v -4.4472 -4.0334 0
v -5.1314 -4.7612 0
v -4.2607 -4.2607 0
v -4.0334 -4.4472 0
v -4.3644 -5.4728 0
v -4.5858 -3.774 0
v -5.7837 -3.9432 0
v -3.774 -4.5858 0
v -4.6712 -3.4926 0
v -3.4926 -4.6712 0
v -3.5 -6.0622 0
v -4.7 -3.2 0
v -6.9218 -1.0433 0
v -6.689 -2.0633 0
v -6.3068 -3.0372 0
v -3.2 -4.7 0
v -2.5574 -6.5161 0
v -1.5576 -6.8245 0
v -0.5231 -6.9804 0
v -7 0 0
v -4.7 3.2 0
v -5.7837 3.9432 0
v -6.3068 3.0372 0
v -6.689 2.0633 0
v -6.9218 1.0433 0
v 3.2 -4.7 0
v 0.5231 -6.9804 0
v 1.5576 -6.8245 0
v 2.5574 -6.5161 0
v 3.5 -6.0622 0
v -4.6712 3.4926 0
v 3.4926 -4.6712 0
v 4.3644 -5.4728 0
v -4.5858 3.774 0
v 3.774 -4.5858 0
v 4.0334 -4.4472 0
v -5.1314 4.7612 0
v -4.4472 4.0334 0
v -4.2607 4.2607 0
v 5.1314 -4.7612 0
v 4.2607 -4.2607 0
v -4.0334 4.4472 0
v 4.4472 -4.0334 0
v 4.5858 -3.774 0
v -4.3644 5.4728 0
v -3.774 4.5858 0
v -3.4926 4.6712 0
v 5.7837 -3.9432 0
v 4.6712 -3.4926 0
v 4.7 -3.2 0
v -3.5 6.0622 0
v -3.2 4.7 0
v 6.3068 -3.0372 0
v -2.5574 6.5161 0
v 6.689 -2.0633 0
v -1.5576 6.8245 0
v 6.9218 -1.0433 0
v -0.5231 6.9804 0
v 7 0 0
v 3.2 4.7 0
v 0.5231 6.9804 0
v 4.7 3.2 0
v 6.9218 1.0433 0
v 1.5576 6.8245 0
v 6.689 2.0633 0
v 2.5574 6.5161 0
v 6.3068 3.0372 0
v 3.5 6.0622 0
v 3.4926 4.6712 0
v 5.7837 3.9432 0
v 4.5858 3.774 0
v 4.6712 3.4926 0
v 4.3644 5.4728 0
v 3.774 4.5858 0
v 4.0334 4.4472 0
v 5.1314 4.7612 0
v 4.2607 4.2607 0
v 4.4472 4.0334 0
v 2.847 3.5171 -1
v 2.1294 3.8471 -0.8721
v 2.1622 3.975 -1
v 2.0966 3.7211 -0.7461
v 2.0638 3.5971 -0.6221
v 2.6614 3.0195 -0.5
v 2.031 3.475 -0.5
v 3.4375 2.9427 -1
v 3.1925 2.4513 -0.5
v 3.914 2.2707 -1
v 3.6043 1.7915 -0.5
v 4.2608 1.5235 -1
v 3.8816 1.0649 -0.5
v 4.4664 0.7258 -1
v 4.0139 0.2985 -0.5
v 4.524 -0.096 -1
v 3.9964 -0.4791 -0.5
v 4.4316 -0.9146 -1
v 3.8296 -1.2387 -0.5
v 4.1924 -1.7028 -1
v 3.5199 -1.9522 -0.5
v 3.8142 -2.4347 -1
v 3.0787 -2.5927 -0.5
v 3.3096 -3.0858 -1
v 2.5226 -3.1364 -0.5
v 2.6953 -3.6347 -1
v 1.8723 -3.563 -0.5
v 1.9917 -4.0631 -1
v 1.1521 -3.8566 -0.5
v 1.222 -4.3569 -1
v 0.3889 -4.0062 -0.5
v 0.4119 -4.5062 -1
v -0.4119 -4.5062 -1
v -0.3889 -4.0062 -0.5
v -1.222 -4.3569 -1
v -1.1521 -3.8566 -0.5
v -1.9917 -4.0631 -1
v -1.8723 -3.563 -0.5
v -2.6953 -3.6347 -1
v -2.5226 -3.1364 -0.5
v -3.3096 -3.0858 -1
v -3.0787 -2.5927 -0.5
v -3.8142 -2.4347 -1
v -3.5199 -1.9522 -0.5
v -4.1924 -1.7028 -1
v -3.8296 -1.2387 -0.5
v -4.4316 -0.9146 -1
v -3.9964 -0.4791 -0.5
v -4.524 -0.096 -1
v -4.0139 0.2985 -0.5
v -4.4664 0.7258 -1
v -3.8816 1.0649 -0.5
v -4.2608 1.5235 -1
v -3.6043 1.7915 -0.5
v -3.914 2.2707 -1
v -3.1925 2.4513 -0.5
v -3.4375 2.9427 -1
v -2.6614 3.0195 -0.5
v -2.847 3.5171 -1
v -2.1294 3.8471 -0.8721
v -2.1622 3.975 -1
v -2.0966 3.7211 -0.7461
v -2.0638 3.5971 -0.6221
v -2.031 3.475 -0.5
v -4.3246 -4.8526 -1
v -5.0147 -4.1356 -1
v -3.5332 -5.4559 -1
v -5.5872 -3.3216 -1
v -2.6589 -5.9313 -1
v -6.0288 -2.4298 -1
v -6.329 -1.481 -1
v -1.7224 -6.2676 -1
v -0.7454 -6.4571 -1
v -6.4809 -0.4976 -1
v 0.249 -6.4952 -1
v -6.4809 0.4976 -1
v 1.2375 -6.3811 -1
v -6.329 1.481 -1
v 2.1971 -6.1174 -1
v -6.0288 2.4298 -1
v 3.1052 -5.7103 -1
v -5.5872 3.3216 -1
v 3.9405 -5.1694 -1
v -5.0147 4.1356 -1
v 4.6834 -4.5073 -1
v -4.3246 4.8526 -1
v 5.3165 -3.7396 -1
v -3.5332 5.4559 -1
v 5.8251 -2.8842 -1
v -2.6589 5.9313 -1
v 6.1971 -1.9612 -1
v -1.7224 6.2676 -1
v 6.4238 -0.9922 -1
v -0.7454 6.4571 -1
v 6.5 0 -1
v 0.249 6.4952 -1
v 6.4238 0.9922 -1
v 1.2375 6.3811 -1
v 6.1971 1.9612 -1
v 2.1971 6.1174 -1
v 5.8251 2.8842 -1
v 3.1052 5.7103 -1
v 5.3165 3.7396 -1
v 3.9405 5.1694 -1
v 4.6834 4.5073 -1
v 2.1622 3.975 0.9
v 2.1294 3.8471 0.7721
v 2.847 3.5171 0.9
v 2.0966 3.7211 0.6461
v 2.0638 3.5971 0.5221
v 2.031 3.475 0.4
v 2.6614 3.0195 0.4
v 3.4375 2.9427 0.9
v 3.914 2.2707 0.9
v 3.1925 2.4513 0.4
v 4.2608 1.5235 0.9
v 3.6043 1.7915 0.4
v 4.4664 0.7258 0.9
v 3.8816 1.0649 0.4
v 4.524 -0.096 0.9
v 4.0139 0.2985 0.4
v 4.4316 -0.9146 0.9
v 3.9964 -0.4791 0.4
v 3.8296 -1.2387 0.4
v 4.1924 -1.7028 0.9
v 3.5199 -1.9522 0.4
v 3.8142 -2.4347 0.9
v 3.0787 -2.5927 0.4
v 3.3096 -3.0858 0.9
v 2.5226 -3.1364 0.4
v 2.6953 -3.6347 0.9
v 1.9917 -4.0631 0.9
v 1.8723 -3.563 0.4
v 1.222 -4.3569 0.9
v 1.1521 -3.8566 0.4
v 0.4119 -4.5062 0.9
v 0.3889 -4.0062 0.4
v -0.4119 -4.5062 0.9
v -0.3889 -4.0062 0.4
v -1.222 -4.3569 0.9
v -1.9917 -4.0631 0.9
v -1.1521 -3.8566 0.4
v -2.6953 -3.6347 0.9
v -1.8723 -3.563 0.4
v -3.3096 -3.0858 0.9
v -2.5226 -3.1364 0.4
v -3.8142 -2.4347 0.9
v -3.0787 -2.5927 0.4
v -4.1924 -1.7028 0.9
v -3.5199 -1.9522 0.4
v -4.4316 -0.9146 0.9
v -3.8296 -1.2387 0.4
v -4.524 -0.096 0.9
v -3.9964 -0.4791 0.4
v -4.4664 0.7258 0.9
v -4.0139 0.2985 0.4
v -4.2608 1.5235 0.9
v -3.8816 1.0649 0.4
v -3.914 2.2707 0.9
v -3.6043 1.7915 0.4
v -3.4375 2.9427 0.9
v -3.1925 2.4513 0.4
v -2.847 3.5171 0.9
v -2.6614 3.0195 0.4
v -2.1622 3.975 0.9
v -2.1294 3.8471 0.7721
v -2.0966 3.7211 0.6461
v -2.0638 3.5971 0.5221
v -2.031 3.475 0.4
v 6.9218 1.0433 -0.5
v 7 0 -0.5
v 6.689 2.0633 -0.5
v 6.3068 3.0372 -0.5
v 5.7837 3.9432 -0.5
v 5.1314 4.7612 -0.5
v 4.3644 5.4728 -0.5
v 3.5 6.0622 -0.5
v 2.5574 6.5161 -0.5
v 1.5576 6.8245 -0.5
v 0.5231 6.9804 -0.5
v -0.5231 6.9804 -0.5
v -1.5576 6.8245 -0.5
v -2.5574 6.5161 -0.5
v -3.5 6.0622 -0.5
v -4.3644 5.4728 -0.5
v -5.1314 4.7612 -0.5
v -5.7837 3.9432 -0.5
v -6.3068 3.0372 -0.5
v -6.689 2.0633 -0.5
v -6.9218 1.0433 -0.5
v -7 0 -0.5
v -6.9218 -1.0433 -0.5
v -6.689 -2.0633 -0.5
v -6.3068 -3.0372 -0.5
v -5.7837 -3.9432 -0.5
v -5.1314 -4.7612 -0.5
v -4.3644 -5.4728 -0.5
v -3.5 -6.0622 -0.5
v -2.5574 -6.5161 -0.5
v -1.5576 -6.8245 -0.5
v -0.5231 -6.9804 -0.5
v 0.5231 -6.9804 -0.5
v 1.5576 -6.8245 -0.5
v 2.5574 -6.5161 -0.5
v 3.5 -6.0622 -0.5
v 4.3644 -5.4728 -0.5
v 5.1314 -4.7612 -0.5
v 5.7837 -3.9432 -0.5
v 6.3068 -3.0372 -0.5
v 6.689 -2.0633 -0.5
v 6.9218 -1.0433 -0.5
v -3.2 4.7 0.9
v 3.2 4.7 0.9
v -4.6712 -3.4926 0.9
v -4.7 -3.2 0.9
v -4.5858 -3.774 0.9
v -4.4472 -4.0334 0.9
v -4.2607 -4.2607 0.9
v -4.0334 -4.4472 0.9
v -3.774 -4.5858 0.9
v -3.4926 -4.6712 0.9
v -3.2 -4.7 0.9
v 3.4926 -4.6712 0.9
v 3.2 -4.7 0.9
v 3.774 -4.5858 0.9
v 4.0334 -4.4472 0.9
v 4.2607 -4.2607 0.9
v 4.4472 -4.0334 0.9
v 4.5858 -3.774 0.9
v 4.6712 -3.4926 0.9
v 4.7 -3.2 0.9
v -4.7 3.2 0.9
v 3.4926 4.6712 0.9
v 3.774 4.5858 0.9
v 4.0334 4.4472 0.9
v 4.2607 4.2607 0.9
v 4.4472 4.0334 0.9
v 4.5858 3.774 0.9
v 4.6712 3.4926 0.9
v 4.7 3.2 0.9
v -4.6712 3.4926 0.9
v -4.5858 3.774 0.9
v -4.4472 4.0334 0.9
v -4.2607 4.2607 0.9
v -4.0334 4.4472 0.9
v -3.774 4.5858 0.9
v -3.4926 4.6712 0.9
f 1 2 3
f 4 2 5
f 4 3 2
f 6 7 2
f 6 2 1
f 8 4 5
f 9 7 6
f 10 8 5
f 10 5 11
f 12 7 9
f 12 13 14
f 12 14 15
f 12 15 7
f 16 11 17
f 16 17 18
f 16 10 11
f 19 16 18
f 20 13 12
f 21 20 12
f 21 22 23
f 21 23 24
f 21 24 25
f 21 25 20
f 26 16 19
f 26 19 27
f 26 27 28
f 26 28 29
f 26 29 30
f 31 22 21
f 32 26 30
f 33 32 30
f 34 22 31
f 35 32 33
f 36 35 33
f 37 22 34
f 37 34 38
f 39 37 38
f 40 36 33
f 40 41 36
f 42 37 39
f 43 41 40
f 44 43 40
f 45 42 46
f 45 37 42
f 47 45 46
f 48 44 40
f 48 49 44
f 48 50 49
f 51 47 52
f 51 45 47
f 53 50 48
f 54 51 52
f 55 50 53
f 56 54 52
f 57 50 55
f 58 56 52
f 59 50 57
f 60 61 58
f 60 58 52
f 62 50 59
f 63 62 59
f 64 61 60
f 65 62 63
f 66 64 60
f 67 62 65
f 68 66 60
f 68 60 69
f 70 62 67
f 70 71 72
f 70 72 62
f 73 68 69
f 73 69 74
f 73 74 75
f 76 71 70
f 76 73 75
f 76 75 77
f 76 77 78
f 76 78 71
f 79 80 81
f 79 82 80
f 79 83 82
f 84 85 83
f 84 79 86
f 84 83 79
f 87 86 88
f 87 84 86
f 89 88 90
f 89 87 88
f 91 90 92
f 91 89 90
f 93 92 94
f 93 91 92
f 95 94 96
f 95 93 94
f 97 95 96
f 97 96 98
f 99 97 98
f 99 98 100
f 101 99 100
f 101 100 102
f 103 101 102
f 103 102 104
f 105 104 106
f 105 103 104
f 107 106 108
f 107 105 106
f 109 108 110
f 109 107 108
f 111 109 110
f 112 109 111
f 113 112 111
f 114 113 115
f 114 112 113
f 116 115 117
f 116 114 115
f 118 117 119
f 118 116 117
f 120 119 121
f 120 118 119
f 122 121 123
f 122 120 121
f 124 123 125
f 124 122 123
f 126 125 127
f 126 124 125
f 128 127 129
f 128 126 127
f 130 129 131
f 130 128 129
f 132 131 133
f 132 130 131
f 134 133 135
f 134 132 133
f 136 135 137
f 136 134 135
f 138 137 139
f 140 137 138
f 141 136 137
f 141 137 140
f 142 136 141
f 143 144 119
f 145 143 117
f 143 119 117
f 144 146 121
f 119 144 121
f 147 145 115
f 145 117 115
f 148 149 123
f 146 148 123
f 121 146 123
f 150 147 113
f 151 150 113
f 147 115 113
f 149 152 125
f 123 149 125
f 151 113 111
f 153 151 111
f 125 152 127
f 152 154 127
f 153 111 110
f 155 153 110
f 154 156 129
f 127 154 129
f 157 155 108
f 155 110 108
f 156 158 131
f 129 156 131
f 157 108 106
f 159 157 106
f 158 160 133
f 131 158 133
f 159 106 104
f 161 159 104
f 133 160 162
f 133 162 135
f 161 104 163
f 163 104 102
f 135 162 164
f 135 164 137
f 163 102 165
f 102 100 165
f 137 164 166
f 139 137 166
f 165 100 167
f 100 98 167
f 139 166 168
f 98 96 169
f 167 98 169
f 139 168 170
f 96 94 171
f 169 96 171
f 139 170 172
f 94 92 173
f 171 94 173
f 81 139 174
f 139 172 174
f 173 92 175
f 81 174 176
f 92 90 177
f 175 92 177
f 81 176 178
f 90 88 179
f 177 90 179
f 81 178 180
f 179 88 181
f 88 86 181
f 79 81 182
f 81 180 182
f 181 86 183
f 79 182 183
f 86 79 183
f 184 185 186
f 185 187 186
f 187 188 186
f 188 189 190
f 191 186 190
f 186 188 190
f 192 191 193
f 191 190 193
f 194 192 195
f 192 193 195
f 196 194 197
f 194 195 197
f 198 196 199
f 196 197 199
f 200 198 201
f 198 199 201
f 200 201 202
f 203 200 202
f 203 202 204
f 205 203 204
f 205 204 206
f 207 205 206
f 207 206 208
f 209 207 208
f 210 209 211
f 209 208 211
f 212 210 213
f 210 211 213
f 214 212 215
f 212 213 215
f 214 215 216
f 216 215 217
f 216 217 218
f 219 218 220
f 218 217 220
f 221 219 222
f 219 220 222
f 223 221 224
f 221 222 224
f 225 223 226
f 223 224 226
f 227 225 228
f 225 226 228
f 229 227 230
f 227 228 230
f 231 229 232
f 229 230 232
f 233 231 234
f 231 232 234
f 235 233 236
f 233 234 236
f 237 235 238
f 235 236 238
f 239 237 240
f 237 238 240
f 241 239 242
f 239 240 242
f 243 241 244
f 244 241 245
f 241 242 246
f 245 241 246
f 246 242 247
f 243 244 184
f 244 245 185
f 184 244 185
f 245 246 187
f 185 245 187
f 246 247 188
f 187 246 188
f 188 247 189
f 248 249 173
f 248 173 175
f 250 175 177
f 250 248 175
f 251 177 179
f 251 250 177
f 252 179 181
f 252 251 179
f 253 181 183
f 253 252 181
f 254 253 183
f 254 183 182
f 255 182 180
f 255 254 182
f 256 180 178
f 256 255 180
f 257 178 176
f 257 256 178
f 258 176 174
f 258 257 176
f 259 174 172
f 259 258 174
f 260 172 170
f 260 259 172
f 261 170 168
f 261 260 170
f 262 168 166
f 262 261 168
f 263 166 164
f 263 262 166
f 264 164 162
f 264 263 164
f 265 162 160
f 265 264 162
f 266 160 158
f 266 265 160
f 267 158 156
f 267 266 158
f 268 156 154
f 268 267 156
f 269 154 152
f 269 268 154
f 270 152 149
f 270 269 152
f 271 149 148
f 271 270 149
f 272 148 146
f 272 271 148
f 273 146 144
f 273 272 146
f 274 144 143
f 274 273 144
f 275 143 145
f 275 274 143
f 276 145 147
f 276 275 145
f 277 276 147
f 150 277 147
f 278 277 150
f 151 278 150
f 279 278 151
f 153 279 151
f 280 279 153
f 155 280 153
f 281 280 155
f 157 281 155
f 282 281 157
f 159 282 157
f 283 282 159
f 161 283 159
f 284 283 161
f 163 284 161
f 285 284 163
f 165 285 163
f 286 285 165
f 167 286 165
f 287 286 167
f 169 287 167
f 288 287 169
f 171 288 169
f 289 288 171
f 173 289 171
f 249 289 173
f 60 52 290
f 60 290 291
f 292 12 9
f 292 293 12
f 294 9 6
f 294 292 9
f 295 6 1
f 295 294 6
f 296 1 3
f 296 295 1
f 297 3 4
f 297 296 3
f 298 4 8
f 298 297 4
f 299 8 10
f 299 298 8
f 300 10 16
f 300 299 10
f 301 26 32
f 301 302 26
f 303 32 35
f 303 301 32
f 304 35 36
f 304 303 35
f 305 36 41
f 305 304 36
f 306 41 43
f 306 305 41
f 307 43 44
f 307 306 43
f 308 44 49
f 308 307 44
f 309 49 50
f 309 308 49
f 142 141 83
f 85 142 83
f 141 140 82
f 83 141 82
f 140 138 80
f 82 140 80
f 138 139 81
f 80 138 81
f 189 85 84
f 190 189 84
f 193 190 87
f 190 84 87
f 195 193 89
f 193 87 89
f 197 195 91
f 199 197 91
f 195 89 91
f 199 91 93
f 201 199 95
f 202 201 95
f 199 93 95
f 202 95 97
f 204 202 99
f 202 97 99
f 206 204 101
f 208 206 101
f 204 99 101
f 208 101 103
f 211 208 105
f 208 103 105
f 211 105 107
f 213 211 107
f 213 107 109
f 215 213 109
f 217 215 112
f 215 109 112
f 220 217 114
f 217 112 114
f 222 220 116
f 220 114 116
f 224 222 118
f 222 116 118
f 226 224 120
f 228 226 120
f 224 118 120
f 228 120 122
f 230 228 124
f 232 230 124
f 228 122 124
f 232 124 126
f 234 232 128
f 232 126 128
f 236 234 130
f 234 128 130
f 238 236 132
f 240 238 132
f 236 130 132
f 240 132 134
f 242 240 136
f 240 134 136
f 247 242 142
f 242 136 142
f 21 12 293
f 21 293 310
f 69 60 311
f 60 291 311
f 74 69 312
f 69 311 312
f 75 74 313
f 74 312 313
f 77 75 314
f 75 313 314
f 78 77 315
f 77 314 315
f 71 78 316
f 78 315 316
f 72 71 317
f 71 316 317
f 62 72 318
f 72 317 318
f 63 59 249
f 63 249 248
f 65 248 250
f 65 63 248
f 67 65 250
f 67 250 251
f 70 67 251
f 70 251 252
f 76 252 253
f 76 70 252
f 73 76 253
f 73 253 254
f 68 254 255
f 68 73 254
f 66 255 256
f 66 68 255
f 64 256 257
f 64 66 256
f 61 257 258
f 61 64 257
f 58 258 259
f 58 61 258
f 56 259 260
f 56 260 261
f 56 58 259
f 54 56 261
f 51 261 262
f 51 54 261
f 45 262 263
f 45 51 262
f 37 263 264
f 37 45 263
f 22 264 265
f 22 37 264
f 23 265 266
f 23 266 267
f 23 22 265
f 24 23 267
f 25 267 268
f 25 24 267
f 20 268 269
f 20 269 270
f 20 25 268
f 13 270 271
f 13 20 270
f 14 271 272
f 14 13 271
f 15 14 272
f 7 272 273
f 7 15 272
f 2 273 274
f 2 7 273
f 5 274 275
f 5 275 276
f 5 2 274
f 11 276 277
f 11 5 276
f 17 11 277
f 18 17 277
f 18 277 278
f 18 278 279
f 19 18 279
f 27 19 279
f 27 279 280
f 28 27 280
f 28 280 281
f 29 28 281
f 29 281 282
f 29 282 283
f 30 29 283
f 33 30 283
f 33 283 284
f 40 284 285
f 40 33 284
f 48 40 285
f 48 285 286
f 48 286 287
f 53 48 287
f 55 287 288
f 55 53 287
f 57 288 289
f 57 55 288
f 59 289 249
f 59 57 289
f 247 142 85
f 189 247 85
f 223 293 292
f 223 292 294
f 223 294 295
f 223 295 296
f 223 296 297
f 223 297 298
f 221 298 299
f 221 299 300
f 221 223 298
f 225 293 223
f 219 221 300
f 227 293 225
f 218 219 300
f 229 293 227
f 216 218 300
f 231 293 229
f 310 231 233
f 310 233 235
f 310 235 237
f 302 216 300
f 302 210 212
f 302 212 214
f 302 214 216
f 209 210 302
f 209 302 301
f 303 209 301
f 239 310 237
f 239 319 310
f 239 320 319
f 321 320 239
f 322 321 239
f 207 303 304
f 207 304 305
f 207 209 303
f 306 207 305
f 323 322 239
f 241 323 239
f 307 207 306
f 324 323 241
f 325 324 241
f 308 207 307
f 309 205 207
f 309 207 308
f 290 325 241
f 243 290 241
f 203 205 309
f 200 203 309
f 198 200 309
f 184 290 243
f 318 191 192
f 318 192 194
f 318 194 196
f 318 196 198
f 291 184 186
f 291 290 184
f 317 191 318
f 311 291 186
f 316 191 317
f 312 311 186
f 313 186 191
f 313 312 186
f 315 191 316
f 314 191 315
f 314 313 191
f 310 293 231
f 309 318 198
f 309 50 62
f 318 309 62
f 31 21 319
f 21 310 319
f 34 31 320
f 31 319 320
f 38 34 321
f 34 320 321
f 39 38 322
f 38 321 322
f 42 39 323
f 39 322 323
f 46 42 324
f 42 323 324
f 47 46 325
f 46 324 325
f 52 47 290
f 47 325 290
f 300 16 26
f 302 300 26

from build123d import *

# Parameters (mm, degrees)
F0_R     = 7
F1_DEPTH = 1
F2_W     = 9.4
F2_H     = 9.4
F3_DEPTH = 0.9
F4_SIZE2 = 0.5
F4_SIZE  = 0.5
F5_R     = 1.5


with BuildPart() as f1:
    # F0 (on Top) → F1 (new body)
    with BuildSketch(Plane.XY):
        Circle(F0_R)
        with BuildLine():
            ThreePointArc((2.03101, 3.475), (0, -4.025), (-2.03101, 3.475))
            Line((-2.03101, 3.475), (2.03101, 3.475))
        make_face(mode=Mode.SUBTRACT)
    extrude(amount=-F1_DEPTH)

    # F2 (on face) → F3 (join)
    with BuildSketch(Plane.XY):
        Rectangle(F2_W, F2_H)
        with BuildLine():
            Line((-2.03101, 3.475), (2.03101, 3.475))
            ThreePointArc((2.03101, 3.475), (0, -4.025), (-2.03101, 3.475))
        make_face(mode=Mode.SUBTRACT)
    extrude(amount=F3_DEPTH)

    # F4
    f4_edges = [f1.edges().sort_by_distance(p)[0] for p in [
        (0, -4.025, -1),
        (-7, 0, -1),
        (0, 3.475, -1),
        (0, -4.025, 0.9),
        (0, 3.475, 0.9),
    ]]
    chamfer(f4_edges, length=F4_SIZE, length2=F4_SIZE2)

    # F5
    f5_edges = [f1.edges().sort_by_distance(p)[0] for p in [
        (-4.7, 4.7, 0.45),
        (4.7, 4.7, 0.45),
        (4.7, -4.7, 0.45),
        (-4.7, -4.7, 0.45),
    ]]
    fillet(f5_edges, radius=F5_R)


solid = f1.part
